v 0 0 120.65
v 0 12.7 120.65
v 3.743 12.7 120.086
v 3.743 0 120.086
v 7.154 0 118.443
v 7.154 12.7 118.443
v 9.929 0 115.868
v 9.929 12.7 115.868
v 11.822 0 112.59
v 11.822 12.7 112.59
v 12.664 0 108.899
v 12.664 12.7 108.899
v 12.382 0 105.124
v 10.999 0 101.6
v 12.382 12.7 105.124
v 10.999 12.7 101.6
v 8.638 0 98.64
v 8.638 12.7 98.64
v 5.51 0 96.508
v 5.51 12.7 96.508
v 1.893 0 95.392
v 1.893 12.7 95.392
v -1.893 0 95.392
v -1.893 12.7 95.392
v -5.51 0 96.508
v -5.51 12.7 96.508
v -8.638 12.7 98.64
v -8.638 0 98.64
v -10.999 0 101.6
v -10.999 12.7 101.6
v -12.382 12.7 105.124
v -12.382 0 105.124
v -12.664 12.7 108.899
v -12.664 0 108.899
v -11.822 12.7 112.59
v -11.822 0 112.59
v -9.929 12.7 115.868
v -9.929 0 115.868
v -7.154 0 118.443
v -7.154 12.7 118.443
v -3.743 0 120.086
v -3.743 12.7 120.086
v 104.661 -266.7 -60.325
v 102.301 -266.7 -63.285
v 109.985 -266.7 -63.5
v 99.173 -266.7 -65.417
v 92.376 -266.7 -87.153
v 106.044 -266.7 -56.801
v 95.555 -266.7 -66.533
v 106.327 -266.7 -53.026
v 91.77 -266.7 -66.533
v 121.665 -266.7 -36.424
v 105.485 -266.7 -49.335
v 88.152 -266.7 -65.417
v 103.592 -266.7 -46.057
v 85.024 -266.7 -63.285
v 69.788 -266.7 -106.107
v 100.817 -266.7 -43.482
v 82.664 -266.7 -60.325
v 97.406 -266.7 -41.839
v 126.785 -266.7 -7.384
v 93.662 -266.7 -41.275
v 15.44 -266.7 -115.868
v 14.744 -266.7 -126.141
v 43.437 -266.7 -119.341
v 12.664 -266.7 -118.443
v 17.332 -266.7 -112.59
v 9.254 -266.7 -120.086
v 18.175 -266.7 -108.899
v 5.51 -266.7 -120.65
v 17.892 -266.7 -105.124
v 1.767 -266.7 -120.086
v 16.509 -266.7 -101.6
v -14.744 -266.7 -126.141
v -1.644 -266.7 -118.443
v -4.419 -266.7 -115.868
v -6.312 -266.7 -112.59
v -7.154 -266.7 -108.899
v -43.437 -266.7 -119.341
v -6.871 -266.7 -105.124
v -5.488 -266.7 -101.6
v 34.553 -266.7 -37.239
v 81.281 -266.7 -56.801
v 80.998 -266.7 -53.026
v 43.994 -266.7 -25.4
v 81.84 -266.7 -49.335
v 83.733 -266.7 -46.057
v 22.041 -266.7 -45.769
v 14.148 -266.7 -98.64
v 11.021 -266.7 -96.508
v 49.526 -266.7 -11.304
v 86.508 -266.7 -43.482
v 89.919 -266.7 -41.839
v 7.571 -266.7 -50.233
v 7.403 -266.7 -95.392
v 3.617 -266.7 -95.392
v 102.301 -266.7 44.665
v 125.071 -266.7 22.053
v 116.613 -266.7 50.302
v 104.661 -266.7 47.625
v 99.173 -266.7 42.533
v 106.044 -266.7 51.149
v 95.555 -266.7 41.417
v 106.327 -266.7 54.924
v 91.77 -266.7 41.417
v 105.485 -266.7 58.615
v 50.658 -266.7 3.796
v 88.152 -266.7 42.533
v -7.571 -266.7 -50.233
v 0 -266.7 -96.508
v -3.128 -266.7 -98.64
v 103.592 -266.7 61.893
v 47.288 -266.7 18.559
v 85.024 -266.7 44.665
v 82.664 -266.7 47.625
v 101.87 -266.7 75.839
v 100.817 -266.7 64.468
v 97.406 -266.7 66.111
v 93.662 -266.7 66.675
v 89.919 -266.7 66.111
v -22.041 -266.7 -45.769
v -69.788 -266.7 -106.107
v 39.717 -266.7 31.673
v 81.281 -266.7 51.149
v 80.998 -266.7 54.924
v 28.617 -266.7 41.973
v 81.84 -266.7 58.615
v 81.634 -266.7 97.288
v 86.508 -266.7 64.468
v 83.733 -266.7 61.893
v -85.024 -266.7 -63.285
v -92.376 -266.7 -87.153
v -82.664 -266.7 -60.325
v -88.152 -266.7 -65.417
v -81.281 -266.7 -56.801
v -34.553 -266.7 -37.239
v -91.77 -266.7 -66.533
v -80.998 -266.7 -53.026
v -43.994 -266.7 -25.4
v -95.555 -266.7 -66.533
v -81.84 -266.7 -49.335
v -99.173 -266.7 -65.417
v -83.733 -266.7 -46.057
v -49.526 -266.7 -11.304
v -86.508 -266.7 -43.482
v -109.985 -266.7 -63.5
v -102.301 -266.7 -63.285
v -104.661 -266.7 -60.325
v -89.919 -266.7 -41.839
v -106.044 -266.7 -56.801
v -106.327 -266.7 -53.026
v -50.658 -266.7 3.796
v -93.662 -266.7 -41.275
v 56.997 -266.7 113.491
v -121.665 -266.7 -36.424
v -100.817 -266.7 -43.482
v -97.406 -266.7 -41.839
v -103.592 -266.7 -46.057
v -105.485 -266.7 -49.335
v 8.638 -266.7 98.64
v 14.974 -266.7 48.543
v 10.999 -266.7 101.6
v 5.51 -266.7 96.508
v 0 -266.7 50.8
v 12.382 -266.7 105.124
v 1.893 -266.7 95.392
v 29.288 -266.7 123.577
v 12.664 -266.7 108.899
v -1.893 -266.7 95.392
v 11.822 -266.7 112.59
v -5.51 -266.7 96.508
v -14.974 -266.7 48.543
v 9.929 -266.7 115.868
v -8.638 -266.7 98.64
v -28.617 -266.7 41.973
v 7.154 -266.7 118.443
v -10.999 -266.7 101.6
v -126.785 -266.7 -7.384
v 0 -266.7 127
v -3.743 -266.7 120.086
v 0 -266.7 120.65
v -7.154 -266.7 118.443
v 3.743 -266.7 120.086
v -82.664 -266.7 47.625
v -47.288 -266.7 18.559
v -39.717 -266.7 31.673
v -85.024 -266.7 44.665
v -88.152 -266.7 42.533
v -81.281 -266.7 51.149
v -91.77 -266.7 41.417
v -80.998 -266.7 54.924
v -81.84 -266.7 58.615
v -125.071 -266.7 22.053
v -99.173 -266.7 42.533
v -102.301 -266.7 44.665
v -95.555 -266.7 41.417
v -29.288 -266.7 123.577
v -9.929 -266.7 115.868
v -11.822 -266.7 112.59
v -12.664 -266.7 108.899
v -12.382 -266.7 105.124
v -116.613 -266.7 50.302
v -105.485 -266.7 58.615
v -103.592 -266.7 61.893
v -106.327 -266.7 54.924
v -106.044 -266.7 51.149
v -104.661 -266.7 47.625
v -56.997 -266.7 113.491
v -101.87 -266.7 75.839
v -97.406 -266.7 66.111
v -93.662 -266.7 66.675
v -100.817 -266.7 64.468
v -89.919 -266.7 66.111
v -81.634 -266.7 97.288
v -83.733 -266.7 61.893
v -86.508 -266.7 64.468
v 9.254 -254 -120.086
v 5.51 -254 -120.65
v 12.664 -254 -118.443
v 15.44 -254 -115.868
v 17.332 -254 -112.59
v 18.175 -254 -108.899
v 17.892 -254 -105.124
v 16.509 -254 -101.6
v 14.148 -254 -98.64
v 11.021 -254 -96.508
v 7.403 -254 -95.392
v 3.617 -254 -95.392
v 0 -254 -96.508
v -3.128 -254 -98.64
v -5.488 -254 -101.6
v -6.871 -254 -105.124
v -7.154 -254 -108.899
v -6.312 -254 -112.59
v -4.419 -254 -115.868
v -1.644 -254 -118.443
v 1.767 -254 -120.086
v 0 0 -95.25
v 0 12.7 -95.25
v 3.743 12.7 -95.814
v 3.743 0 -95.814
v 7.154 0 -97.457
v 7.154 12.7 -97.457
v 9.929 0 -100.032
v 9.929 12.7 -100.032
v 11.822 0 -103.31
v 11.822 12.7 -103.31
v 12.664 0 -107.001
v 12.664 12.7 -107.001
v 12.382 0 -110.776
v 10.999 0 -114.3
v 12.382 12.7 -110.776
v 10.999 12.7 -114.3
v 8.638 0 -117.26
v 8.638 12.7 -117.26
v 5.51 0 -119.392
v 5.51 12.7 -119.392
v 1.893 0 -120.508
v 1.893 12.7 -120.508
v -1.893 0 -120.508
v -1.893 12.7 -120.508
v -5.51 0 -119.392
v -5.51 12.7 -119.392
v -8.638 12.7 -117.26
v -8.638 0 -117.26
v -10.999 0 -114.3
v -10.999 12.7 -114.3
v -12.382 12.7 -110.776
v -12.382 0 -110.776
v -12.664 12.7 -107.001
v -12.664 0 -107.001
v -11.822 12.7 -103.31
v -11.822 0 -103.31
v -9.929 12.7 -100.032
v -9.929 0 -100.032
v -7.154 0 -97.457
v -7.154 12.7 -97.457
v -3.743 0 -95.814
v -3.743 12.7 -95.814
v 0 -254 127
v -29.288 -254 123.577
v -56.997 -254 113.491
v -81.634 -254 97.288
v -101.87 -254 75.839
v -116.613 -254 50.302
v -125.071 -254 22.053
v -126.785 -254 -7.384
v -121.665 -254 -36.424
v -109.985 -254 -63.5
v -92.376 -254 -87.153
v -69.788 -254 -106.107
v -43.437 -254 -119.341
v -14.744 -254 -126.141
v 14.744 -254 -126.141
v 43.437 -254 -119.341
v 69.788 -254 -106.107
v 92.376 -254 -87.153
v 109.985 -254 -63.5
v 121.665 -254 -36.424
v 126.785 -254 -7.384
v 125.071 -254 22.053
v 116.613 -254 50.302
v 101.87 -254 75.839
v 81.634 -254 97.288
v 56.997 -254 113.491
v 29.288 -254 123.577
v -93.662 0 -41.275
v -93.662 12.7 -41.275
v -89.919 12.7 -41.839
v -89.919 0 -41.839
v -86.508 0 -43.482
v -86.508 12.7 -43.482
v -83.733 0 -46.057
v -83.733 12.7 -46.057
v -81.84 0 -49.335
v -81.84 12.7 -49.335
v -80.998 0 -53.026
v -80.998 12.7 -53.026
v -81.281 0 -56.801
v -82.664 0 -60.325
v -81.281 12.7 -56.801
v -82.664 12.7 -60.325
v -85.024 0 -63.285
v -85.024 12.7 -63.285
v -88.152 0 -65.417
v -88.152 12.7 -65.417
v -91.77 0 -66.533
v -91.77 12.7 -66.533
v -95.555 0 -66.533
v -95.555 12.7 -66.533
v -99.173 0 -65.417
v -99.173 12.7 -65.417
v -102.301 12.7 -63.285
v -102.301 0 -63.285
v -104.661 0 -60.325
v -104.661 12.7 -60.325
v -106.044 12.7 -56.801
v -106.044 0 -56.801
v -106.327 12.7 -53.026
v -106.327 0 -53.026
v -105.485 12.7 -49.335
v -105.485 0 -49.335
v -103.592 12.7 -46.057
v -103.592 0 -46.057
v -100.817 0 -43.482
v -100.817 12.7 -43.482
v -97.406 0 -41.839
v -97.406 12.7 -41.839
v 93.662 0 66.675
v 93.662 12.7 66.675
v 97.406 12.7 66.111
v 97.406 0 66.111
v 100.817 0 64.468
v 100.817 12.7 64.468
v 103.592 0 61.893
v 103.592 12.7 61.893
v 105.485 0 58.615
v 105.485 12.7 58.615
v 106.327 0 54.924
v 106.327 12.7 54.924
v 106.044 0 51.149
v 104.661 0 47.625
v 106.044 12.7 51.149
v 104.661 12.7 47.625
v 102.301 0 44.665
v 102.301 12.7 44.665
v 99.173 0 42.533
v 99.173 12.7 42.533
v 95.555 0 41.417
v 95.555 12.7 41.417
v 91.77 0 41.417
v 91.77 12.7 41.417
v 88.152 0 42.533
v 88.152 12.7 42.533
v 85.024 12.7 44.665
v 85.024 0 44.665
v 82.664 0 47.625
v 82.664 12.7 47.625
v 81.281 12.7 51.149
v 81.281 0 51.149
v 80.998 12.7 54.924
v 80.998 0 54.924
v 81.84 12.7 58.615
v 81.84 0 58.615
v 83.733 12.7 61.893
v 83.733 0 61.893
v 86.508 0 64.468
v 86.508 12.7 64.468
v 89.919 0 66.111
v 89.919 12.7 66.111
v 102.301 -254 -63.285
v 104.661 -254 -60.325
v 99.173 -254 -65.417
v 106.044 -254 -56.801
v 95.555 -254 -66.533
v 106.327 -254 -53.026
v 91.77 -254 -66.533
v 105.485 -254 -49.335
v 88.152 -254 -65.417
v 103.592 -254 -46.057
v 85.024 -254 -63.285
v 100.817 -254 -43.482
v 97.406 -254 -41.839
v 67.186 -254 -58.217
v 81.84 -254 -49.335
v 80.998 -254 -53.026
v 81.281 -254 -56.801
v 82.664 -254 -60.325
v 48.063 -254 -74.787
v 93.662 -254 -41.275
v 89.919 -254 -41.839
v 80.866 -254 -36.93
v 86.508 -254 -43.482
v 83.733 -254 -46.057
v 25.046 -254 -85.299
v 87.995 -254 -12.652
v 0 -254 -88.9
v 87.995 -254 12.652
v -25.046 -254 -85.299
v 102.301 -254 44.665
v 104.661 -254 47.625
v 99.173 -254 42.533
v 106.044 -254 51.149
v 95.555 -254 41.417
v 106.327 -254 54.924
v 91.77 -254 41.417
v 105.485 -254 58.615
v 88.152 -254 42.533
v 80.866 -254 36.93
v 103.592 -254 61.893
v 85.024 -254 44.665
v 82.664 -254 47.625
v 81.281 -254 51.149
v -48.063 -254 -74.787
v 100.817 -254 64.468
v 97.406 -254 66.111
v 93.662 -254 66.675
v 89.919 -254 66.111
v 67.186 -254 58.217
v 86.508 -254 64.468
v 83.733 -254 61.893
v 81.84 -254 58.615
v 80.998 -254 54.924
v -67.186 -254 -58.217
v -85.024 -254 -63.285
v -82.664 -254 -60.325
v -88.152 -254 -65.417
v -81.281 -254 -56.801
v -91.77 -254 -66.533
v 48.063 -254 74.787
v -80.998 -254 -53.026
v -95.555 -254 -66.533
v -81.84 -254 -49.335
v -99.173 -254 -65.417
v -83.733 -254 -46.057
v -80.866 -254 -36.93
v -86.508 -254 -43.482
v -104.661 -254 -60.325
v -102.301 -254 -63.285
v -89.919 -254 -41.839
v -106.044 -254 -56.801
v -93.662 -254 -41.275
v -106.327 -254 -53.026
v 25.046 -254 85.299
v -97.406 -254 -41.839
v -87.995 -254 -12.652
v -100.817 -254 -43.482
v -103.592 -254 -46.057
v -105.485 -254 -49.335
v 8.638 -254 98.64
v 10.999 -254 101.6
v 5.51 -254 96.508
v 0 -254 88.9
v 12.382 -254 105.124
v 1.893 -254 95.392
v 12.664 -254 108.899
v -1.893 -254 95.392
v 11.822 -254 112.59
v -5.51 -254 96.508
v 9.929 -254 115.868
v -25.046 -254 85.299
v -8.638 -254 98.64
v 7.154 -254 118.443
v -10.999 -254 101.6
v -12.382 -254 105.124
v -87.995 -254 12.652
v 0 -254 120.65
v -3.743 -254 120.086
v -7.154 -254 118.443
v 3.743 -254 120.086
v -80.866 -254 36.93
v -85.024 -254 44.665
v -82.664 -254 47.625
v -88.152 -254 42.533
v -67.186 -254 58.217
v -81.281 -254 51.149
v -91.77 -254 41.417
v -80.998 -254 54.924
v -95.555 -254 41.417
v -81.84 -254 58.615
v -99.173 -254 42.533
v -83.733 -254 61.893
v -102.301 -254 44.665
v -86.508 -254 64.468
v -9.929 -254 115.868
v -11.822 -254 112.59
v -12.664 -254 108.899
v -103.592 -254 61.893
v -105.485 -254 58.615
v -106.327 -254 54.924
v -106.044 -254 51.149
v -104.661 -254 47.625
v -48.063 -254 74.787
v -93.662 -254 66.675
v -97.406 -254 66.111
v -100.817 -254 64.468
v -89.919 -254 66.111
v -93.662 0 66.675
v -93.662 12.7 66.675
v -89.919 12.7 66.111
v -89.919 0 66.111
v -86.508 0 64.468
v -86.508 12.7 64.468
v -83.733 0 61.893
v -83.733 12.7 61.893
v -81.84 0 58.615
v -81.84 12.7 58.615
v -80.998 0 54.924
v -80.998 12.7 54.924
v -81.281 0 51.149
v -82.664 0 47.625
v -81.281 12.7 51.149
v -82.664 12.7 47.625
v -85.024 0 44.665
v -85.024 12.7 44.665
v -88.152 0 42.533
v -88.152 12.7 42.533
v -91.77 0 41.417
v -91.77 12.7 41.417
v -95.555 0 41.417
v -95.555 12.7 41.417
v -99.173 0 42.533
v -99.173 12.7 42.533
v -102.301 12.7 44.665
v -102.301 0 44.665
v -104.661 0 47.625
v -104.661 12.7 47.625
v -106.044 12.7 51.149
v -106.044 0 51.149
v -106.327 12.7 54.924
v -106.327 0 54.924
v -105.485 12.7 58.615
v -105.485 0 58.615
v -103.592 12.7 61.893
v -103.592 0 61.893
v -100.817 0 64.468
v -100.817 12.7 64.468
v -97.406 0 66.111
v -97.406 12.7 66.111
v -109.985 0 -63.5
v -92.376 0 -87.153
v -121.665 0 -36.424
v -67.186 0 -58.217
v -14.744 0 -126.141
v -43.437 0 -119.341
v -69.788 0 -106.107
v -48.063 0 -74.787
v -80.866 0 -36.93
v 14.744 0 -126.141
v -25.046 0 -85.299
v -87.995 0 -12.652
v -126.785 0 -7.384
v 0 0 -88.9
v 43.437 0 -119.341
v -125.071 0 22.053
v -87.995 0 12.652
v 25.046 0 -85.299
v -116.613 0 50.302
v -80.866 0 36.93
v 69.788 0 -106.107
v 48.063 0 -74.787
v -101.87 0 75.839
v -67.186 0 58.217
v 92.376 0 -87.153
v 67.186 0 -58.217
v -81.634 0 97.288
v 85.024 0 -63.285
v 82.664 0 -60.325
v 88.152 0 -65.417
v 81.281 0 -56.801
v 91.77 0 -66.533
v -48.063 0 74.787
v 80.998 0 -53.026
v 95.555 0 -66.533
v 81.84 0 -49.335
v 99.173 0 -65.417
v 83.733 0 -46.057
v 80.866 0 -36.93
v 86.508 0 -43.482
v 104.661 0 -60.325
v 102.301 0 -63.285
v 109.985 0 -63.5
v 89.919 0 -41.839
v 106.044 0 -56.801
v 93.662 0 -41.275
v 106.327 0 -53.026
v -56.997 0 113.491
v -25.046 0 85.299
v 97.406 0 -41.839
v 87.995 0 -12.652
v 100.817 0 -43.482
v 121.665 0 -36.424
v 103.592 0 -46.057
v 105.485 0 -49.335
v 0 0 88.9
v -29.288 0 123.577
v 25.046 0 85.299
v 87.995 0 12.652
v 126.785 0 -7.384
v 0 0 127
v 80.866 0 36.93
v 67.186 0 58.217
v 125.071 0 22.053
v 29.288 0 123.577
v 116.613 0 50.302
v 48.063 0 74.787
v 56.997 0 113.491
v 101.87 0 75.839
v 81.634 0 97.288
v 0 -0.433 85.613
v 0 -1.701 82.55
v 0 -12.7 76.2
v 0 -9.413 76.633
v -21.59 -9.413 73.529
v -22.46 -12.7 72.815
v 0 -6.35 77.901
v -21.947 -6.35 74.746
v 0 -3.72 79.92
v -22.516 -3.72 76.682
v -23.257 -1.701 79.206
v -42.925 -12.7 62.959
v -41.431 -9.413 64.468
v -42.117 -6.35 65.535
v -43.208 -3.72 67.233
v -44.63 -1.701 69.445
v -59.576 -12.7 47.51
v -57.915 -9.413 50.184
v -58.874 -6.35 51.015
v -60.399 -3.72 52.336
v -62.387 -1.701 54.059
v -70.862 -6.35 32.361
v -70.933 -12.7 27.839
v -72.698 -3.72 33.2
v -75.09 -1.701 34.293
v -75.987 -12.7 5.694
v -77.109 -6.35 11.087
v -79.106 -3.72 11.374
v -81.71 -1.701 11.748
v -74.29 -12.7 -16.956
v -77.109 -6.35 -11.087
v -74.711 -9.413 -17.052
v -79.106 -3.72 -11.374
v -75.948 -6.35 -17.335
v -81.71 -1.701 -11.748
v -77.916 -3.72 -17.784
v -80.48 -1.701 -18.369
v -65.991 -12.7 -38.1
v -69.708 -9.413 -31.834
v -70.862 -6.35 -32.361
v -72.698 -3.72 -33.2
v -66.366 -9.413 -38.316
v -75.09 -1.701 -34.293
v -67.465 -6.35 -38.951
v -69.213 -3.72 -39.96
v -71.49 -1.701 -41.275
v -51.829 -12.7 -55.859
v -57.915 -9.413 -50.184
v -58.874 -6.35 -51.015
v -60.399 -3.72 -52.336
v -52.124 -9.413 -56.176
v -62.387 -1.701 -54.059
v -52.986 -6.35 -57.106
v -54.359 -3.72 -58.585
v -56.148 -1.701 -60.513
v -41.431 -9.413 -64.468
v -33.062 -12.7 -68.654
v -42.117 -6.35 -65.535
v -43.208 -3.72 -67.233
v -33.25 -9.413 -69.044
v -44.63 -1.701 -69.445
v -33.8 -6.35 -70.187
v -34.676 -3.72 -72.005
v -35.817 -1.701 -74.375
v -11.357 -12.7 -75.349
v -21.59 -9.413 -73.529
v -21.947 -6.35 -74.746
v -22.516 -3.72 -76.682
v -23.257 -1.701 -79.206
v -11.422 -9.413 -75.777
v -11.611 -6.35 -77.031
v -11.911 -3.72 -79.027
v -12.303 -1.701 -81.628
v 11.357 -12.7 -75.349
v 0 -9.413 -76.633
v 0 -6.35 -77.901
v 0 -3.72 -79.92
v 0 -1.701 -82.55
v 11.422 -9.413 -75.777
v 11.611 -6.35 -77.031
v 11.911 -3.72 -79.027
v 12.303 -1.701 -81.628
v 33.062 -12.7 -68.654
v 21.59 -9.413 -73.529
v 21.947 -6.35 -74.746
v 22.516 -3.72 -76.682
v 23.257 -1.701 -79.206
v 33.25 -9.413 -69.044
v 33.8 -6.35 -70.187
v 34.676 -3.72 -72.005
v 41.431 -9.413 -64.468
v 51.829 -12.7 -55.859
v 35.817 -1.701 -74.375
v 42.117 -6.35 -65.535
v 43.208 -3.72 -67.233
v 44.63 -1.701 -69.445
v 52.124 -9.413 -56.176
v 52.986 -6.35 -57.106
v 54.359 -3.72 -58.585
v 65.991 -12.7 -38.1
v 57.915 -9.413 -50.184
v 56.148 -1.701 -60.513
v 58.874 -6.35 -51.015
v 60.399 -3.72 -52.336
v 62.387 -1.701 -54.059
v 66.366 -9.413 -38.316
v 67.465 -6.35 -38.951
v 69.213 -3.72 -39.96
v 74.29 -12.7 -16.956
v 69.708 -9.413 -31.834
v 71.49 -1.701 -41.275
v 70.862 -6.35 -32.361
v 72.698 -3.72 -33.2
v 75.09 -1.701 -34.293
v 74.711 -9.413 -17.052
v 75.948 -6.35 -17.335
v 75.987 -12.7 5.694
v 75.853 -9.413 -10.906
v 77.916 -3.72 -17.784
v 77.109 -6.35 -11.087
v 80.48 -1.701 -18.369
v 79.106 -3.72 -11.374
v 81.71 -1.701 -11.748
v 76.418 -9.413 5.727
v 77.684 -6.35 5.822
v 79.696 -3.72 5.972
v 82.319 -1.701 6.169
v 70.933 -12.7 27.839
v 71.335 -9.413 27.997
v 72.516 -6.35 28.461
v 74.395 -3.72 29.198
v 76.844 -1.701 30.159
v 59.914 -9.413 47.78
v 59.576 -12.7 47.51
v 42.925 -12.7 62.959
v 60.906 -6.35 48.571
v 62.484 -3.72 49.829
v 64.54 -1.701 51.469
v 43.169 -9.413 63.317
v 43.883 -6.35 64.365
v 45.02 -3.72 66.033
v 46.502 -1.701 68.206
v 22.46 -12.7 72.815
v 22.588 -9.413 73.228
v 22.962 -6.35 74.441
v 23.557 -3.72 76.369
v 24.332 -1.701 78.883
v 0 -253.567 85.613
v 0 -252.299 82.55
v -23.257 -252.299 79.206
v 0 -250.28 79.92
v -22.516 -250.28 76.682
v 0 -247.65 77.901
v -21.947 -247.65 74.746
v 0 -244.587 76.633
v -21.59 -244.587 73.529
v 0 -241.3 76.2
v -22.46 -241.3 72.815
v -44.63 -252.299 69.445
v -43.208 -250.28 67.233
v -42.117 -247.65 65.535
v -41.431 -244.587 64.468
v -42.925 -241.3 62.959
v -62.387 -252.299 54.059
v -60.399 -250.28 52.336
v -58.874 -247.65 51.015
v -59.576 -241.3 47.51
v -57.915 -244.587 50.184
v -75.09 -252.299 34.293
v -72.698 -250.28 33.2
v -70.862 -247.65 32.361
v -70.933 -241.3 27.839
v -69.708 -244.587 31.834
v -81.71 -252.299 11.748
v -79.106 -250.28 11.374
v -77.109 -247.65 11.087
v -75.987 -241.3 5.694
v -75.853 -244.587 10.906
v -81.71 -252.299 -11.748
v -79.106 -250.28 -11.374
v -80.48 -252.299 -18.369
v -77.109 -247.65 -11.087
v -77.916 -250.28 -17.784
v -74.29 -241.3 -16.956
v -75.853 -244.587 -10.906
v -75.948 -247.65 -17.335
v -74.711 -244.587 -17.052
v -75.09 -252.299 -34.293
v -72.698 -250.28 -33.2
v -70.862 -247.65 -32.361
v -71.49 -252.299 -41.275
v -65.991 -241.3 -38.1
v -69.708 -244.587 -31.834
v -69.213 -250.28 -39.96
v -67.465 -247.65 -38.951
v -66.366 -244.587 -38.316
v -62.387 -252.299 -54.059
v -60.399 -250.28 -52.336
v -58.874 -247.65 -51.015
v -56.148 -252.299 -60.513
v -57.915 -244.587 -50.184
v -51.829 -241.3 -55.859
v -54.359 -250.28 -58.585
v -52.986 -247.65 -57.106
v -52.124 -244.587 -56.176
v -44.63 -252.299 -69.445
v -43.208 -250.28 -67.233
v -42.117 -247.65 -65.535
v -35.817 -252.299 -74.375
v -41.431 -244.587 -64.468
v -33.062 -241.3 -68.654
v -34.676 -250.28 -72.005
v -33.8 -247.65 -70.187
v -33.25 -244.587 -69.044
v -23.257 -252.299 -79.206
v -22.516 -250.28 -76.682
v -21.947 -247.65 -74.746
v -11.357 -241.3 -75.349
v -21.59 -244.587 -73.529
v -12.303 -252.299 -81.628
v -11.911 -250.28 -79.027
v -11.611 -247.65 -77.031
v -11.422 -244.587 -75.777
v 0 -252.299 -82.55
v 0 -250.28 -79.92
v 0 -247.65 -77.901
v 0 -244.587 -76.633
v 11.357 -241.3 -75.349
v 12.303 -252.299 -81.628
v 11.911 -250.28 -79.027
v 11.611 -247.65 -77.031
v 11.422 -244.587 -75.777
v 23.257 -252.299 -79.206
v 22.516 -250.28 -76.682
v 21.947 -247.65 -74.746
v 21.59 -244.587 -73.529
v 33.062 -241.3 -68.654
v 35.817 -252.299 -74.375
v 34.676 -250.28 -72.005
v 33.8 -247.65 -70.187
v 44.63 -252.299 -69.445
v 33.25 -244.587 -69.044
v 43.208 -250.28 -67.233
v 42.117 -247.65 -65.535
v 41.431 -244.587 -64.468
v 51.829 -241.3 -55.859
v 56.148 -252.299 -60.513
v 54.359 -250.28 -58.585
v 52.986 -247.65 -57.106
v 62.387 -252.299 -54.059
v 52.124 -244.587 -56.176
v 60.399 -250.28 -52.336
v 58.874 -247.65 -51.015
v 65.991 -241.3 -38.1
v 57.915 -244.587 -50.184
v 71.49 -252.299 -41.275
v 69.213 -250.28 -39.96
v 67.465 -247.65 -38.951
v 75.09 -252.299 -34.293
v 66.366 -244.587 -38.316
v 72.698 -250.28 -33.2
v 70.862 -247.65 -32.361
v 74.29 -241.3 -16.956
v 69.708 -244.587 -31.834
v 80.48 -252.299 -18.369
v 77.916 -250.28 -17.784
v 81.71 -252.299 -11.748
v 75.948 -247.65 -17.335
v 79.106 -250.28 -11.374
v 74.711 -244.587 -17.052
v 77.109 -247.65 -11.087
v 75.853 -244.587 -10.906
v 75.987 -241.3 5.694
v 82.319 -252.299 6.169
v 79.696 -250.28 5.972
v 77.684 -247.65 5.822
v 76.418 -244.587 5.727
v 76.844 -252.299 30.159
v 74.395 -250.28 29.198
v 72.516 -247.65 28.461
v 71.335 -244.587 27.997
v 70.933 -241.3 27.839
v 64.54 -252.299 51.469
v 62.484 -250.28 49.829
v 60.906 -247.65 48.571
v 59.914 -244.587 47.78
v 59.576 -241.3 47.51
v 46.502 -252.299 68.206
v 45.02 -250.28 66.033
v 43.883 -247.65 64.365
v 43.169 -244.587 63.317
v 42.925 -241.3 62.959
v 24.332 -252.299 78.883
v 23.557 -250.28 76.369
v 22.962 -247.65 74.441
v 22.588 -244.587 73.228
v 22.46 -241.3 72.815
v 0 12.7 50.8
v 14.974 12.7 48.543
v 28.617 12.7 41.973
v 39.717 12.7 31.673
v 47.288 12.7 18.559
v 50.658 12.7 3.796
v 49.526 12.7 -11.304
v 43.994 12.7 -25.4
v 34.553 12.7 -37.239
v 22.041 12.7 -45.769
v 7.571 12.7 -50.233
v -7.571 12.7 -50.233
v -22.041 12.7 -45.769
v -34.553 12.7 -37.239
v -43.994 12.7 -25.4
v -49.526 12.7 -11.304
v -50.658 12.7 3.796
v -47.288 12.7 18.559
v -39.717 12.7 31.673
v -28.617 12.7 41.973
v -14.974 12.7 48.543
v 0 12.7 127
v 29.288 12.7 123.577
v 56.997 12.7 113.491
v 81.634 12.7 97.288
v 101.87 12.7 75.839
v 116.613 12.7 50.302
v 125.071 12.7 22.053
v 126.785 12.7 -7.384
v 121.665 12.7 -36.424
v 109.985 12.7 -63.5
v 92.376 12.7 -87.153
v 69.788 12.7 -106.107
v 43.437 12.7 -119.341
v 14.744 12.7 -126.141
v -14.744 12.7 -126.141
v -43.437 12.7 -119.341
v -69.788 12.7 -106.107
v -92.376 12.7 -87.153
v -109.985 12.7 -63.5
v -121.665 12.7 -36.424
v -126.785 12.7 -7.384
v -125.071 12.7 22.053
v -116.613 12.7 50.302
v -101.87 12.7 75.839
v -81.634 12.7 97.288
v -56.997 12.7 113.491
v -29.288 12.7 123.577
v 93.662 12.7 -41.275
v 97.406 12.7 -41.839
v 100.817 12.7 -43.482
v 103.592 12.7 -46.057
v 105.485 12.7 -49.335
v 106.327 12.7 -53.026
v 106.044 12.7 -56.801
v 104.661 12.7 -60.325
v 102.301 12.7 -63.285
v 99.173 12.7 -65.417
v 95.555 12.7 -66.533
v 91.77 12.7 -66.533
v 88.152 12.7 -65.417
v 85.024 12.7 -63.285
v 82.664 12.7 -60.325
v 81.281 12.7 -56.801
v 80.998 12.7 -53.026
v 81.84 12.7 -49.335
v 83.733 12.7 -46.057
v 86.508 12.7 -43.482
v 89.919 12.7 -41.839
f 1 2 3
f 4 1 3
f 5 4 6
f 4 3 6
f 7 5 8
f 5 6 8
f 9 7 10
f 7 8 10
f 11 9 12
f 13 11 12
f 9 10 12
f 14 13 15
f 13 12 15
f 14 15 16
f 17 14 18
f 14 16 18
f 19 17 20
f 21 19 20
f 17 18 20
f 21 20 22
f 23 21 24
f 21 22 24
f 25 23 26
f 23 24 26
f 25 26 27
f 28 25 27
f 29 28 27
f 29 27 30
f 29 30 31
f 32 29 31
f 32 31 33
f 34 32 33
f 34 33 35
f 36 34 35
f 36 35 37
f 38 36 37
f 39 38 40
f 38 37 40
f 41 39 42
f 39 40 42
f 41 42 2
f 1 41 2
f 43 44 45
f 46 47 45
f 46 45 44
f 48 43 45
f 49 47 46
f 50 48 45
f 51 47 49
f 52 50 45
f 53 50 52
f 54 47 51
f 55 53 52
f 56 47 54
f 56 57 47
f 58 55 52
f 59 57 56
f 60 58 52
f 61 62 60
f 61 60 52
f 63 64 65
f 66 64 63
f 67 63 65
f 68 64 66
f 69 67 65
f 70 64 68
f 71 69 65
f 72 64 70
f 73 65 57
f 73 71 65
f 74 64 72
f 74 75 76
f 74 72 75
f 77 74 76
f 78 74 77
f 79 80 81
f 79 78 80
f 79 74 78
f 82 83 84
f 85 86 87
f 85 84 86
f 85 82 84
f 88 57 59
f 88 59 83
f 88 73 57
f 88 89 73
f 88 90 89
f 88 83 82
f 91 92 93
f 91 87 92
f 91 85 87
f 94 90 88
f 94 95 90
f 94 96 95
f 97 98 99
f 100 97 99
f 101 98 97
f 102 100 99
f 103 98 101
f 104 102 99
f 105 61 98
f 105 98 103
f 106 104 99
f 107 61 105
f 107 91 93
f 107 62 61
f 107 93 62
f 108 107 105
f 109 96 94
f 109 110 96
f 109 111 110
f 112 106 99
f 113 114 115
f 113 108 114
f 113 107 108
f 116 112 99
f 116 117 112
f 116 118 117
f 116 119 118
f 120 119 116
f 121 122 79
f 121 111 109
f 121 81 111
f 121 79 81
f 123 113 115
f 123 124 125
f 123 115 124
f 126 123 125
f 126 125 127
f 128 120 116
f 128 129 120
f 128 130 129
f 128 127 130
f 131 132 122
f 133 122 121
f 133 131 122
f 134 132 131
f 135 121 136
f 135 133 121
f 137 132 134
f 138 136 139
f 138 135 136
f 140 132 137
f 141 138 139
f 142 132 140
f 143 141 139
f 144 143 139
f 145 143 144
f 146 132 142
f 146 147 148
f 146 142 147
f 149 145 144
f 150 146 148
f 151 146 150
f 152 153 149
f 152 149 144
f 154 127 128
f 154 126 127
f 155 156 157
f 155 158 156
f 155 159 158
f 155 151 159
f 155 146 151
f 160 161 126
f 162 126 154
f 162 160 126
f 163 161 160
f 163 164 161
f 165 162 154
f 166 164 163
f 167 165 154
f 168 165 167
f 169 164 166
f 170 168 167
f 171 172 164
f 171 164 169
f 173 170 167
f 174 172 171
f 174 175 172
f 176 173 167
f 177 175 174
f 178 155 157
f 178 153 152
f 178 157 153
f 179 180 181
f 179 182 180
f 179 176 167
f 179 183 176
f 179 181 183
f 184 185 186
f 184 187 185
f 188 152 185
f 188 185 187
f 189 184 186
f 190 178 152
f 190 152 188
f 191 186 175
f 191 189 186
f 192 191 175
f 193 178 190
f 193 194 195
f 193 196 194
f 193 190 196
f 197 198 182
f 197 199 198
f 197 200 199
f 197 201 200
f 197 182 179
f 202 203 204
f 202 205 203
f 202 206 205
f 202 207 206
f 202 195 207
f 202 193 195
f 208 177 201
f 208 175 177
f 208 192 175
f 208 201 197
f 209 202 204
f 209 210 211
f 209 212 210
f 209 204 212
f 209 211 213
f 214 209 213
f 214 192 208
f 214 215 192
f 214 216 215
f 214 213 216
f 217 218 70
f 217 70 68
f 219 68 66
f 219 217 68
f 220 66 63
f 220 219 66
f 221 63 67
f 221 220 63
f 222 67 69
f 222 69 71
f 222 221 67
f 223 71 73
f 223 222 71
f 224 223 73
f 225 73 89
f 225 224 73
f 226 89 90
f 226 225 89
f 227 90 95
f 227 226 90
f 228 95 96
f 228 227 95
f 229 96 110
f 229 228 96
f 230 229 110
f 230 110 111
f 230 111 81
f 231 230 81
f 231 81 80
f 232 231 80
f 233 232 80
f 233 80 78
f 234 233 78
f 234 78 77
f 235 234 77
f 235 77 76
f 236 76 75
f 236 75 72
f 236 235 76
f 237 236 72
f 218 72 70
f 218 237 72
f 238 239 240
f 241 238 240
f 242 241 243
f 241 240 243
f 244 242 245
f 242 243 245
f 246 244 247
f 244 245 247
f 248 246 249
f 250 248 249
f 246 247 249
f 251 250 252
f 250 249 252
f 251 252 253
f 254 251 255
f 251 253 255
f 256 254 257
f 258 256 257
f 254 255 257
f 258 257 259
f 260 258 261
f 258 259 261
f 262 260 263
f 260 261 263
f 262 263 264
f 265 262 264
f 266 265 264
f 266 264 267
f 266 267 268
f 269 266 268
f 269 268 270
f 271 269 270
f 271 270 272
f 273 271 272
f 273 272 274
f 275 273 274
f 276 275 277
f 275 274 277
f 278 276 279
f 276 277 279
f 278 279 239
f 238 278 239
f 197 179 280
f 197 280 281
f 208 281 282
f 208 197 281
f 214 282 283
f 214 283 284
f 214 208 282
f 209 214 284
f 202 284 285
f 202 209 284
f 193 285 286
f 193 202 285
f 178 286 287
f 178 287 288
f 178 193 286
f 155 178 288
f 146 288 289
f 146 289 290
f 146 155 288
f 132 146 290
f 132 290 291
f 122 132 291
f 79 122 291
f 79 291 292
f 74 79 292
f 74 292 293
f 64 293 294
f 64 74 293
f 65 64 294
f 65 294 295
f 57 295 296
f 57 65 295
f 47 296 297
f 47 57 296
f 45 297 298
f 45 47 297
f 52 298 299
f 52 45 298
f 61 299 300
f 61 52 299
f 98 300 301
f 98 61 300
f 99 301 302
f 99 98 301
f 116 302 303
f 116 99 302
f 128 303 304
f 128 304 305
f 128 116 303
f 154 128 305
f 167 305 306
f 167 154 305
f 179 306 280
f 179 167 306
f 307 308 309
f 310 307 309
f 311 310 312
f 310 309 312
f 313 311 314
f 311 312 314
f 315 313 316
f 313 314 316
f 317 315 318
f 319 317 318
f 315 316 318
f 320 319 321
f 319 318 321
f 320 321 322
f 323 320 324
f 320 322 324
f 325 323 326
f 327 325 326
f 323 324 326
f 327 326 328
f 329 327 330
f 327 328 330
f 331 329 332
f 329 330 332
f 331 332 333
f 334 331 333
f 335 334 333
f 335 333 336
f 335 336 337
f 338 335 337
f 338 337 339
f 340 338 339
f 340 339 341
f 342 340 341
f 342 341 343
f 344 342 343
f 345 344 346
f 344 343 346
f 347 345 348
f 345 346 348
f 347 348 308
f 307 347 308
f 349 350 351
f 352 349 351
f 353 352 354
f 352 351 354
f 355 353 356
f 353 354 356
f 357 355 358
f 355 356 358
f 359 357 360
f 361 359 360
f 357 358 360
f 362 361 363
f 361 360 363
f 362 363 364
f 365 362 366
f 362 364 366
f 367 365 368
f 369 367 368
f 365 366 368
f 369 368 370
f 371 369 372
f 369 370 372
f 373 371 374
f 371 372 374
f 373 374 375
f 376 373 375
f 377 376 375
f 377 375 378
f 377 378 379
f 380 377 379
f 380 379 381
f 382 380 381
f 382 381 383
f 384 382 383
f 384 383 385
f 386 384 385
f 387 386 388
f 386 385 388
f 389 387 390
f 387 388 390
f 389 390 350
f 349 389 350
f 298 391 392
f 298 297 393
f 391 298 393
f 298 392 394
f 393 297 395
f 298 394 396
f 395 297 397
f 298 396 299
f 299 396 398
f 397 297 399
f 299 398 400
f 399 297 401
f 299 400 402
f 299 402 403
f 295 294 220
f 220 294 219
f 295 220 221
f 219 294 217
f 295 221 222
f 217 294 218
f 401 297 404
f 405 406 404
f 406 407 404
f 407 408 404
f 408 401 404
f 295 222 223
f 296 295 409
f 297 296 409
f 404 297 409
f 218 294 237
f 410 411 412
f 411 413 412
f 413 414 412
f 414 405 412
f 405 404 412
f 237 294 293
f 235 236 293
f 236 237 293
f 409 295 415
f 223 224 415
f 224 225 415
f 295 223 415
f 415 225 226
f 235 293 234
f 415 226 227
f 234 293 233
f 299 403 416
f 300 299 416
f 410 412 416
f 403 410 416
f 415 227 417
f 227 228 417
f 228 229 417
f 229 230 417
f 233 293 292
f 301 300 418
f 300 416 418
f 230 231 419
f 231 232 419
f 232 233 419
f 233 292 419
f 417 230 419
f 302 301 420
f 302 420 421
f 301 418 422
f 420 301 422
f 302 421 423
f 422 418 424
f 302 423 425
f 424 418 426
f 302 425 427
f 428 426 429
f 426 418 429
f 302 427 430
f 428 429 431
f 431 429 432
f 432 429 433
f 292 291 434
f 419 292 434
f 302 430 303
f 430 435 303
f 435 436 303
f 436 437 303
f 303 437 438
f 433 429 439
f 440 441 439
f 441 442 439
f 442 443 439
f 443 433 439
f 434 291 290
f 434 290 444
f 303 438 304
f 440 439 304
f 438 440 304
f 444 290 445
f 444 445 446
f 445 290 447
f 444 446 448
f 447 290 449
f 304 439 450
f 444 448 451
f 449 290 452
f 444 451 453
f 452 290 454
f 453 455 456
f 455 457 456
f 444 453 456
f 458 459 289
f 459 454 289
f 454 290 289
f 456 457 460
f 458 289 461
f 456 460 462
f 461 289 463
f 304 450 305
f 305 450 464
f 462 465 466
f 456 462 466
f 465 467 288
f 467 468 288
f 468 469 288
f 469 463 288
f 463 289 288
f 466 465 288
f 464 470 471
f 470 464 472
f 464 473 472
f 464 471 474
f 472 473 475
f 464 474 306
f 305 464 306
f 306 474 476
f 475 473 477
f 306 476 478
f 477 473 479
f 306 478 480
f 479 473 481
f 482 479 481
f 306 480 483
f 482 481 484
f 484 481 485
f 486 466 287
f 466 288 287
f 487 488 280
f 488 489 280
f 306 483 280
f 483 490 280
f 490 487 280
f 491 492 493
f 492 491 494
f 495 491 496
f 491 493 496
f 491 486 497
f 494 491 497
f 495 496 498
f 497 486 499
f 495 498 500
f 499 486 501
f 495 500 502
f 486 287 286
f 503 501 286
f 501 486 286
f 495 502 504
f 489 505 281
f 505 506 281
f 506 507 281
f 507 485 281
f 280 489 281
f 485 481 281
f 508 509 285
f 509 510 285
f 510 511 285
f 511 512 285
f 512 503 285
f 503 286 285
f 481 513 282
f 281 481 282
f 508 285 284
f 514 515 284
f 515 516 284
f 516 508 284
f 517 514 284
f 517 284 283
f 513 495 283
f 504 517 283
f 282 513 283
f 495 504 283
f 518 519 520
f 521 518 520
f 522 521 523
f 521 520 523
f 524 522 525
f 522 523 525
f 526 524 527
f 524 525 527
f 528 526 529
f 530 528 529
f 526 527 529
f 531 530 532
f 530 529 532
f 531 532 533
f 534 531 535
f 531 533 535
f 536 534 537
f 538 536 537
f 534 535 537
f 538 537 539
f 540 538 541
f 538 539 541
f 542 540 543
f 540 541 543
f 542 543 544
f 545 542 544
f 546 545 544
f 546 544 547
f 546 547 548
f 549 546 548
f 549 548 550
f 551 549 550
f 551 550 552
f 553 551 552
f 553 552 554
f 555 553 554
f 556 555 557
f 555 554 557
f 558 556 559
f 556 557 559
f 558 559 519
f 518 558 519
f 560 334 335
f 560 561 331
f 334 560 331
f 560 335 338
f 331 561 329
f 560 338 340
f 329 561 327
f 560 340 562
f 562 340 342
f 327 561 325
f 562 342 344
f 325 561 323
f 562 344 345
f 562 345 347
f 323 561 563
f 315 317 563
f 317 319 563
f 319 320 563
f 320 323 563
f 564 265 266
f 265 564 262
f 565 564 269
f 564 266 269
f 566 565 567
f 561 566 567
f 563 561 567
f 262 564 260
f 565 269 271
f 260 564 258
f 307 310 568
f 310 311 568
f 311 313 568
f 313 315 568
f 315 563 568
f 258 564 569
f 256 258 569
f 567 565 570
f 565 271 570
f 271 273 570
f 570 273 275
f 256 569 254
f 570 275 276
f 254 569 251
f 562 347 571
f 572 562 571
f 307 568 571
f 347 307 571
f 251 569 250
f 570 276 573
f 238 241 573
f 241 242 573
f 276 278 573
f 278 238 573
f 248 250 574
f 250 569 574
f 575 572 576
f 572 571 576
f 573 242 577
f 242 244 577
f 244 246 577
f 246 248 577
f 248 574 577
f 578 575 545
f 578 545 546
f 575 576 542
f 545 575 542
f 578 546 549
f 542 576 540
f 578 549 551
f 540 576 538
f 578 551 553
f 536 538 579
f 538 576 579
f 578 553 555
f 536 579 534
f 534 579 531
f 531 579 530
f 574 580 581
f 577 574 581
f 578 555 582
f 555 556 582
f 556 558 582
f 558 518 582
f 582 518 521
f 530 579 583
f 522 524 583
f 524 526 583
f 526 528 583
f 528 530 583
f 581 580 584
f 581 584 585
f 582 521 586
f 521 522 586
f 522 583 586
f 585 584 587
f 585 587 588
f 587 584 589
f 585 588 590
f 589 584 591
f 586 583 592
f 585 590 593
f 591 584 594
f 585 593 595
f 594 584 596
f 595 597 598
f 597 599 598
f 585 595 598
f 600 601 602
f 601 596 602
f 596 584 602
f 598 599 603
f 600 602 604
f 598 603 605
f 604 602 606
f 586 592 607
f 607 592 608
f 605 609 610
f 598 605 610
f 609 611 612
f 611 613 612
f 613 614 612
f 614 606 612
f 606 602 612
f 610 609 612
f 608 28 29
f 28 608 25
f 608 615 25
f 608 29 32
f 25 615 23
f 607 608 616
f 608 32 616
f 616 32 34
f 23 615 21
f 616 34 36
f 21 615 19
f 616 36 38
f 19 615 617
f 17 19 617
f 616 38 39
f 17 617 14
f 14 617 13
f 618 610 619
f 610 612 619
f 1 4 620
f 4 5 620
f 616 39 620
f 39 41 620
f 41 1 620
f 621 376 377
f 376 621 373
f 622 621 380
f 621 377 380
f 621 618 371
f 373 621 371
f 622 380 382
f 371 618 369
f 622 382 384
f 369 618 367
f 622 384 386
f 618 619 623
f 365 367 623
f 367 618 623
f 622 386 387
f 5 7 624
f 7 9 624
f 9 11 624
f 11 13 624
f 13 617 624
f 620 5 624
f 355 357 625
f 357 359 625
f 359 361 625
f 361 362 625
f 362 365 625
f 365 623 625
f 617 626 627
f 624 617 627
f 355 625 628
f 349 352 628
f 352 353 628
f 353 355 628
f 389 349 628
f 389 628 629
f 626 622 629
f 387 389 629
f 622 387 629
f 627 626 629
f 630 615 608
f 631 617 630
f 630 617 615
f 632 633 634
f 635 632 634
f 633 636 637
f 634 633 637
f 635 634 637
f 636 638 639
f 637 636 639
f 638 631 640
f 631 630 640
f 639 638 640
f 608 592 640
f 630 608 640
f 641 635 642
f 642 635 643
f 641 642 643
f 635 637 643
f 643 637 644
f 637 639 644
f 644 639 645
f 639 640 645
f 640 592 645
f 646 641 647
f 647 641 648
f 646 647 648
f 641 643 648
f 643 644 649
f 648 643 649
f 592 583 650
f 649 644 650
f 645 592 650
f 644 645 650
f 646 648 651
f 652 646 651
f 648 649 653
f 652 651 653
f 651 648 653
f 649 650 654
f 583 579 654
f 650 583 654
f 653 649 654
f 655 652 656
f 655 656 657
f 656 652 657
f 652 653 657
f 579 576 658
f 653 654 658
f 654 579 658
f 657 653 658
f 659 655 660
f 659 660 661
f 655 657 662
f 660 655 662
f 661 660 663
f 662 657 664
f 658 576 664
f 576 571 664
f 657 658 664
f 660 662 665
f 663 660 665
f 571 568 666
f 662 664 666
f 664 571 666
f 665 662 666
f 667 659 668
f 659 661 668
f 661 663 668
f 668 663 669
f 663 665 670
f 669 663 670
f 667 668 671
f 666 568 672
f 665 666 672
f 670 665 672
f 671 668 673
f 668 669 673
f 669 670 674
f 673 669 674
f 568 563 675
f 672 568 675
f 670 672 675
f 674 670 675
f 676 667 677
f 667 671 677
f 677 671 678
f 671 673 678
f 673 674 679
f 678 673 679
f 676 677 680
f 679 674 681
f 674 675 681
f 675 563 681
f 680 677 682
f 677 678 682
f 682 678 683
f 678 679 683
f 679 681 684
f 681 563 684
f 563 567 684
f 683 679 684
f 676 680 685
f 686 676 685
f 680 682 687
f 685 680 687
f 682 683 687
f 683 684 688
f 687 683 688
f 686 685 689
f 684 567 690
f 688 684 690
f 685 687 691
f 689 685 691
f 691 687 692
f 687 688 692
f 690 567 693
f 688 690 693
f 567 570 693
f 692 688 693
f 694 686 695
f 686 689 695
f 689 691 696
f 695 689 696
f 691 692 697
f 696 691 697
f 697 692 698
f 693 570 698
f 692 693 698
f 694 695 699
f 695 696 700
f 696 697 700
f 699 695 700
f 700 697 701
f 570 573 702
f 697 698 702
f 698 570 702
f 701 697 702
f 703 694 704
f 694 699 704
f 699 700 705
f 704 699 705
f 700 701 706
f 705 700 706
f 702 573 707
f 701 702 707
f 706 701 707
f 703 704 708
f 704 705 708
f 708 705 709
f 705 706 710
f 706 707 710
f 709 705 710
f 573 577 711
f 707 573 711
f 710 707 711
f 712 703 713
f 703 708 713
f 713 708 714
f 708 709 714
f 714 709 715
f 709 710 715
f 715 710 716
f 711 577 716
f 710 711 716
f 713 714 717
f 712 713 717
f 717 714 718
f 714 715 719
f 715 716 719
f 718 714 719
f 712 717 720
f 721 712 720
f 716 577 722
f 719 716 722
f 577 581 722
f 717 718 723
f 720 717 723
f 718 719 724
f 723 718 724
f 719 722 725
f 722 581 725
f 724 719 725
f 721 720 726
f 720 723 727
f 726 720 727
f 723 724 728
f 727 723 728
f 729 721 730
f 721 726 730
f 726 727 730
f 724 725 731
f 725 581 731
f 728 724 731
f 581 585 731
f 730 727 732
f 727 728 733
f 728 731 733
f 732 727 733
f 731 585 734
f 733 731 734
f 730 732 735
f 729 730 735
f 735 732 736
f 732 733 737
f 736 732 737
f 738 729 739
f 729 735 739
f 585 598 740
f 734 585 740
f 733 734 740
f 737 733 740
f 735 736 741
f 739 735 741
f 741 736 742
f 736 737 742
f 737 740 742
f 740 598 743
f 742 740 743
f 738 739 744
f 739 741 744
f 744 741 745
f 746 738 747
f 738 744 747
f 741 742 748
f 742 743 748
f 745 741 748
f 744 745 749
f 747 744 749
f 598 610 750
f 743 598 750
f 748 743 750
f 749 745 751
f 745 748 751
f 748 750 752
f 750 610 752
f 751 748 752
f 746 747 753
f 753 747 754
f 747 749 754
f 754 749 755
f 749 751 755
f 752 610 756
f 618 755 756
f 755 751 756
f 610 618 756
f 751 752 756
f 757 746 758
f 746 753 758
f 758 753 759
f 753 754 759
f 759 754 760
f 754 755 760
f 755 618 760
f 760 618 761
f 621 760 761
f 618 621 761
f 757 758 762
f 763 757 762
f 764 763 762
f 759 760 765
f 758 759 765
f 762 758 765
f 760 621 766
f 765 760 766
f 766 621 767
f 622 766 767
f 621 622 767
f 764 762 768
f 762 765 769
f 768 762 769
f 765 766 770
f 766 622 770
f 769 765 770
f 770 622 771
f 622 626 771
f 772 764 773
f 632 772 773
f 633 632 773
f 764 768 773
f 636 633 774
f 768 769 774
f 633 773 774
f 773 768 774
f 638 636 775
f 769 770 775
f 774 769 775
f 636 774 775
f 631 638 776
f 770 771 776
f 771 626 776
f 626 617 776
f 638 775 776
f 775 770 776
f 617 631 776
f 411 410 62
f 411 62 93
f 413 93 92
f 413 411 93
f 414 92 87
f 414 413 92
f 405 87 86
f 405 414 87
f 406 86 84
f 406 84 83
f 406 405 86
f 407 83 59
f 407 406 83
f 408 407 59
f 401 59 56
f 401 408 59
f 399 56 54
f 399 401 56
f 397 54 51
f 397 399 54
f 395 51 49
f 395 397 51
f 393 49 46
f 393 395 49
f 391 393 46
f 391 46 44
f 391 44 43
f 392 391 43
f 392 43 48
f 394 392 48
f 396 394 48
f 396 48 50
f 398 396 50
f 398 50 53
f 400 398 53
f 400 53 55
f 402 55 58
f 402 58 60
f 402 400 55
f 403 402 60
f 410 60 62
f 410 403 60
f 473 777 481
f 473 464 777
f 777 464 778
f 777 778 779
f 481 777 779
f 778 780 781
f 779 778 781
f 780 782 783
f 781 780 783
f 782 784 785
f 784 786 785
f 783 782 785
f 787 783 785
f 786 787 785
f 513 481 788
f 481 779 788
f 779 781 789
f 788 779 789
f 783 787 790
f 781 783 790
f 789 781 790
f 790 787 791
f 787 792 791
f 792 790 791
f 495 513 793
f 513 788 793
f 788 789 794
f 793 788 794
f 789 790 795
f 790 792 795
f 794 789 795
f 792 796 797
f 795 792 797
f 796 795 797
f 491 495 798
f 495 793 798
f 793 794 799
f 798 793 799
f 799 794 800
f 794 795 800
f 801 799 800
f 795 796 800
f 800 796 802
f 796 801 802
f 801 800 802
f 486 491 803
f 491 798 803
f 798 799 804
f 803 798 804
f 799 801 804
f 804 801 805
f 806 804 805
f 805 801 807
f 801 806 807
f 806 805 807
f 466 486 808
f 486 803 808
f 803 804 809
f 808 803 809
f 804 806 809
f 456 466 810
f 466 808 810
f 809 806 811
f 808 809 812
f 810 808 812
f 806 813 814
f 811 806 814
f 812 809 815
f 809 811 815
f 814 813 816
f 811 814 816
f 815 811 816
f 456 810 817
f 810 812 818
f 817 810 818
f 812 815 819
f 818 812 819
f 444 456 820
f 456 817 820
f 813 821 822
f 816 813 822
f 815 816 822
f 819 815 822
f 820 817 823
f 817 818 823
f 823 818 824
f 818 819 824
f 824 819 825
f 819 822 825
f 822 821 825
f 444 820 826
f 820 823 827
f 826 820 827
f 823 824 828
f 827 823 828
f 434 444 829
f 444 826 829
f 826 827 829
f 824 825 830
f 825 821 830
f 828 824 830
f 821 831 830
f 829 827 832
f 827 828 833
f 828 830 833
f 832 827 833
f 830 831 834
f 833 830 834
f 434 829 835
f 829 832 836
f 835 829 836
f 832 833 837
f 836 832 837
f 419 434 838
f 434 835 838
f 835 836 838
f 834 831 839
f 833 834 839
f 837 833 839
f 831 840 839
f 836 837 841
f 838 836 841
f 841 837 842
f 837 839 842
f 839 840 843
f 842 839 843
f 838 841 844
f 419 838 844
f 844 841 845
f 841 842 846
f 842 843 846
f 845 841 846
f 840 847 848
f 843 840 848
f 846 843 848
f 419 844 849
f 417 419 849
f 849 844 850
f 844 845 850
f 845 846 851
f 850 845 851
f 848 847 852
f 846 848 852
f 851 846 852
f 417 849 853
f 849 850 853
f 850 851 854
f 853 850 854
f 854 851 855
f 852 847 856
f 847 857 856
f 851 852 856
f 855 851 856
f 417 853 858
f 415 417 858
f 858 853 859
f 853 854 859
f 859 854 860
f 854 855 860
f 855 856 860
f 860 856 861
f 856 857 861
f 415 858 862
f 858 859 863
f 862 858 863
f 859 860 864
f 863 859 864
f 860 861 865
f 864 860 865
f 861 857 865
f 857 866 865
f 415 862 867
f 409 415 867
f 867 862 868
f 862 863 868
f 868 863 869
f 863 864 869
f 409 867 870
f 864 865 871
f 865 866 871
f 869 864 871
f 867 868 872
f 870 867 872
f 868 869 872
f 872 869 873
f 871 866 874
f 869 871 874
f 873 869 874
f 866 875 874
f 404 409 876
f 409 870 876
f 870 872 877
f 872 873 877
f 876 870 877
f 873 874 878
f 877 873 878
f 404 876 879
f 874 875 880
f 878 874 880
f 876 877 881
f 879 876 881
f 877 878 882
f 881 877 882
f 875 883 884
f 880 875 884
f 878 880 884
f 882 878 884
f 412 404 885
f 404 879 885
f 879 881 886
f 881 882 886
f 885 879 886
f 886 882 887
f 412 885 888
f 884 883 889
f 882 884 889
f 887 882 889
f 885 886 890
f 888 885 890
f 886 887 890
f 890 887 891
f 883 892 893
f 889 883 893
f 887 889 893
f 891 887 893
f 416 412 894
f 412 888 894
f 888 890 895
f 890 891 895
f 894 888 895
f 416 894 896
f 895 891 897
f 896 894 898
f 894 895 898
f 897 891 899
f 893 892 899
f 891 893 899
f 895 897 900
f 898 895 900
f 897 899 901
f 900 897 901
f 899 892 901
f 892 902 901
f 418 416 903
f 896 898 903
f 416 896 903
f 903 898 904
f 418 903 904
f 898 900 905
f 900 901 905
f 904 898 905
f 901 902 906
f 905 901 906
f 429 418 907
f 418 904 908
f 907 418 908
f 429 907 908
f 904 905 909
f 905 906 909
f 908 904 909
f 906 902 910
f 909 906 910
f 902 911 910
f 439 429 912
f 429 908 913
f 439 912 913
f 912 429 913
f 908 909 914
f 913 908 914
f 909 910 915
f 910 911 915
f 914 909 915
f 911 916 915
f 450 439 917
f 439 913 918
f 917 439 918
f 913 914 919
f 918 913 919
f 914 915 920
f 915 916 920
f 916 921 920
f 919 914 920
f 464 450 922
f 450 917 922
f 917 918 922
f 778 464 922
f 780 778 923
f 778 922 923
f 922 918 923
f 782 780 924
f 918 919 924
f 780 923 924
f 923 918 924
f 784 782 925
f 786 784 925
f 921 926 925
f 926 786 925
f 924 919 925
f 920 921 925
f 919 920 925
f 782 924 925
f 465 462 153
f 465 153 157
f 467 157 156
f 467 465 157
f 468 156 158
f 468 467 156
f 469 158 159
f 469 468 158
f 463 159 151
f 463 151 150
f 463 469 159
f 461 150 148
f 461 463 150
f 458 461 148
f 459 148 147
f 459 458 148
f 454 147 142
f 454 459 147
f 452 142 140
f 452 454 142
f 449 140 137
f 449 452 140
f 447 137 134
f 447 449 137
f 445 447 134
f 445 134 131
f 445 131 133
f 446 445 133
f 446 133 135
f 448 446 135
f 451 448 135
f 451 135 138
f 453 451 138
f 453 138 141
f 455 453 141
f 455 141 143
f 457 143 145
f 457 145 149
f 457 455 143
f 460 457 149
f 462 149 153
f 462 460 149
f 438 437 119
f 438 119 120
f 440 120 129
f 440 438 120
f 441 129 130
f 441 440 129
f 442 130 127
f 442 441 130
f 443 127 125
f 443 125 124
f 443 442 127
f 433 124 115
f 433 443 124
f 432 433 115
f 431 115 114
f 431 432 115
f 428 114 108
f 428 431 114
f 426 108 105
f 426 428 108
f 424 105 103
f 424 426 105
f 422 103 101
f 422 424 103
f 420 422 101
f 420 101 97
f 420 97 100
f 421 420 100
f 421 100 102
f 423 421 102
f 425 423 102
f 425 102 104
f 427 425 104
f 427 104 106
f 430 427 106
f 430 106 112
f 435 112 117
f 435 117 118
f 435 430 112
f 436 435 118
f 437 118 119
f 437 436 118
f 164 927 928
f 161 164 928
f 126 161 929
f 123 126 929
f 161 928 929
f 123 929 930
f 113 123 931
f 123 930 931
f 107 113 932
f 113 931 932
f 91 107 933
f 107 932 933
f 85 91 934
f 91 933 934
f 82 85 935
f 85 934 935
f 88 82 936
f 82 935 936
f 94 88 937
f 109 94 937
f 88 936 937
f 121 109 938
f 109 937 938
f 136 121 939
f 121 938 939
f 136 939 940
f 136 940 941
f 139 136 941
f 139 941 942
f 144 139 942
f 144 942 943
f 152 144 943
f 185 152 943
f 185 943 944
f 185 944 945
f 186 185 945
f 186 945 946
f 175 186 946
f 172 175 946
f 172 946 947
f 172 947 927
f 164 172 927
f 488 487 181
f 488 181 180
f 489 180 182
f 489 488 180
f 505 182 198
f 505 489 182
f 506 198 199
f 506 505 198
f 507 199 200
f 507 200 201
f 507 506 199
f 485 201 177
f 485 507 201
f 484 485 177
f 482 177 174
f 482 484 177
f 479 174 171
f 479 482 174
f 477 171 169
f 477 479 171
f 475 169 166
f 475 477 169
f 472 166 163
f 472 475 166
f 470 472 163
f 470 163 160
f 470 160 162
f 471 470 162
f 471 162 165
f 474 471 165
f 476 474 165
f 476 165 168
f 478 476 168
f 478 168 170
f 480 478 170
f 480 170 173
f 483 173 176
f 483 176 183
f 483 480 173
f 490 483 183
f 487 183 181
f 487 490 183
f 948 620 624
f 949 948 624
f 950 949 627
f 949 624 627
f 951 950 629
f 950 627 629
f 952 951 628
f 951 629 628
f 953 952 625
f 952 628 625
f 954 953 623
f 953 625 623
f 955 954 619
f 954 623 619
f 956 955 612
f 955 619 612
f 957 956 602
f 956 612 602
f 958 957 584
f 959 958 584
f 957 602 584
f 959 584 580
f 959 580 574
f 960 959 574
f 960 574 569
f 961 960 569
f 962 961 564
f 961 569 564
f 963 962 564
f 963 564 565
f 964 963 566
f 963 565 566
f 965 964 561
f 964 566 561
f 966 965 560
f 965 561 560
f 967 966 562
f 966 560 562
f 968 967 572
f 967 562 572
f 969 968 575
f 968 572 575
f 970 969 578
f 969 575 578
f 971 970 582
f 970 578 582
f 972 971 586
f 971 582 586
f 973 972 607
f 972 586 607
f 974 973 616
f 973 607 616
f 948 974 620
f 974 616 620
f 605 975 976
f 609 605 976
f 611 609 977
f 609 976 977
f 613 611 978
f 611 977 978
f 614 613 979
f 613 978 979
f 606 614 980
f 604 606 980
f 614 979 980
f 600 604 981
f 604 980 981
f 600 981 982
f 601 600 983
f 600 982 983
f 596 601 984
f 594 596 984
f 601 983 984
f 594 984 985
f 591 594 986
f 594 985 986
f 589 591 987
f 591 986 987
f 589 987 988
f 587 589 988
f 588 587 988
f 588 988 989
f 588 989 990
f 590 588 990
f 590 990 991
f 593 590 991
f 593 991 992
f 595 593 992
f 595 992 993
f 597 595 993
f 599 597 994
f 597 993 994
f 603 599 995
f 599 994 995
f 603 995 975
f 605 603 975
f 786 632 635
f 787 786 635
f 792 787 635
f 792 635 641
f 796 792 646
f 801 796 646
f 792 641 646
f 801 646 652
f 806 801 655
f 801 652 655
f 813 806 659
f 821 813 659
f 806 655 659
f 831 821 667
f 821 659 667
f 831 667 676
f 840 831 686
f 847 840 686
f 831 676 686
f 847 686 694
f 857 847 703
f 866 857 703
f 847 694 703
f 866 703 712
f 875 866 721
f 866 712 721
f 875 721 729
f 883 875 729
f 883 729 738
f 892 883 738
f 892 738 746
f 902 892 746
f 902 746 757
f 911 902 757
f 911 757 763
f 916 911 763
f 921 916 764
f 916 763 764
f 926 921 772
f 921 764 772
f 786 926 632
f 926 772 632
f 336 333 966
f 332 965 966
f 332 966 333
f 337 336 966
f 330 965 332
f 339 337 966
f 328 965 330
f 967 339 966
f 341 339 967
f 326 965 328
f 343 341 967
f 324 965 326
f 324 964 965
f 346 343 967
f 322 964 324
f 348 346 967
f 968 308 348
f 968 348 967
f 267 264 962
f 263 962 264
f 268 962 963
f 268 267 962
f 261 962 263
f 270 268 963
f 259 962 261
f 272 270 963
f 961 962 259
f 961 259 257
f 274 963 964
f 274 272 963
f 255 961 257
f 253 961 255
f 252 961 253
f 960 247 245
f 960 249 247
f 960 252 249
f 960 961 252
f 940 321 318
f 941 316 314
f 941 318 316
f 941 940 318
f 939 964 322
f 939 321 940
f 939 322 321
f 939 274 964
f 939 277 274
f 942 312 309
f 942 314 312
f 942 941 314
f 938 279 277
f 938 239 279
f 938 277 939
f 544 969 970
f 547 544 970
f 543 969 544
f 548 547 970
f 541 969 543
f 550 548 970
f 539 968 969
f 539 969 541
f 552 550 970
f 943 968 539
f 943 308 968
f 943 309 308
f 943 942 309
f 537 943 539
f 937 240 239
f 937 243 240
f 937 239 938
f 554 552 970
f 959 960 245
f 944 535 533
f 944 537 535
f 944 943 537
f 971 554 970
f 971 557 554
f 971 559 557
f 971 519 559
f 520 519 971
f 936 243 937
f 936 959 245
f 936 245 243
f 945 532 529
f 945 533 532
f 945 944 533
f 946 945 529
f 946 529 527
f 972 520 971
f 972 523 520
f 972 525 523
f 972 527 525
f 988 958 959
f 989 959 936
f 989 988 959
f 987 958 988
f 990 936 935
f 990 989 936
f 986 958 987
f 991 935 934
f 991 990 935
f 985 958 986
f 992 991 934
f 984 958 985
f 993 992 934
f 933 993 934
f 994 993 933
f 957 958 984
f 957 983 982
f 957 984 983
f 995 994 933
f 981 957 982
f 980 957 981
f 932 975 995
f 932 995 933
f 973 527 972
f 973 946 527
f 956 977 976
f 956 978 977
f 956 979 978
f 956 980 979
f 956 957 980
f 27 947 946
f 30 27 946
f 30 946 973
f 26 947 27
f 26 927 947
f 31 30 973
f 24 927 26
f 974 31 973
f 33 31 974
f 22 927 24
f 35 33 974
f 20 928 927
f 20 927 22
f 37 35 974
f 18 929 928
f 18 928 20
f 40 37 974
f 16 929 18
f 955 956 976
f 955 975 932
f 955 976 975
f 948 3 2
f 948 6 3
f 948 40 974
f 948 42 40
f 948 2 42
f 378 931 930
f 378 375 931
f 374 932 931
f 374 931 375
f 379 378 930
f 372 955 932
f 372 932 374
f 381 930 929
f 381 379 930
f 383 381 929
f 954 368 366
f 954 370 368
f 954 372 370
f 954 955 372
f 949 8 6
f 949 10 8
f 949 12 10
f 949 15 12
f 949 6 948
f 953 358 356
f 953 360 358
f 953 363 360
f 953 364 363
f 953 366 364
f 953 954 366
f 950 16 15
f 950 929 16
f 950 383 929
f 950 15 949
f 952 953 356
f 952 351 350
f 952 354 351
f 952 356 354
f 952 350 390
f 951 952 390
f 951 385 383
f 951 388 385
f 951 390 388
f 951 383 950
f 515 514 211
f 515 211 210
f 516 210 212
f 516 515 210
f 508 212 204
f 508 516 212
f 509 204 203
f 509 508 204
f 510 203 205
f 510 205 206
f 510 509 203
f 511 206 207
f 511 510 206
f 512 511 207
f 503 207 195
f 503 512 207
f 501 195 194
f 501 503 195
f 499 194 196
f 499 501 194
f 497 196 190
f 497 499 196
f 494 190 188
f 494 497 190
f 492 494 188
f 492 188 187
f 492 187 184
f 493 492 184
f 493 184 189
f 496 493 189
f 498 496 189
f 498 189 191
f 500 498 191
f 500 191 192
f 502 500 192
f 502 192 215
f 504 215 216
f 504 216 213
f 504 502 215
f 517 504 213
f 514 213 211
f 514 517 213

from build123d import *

# Parameters (mm, degrees)
SKETCH1_R           = 127
BOSS_EXTRUDE1_DEPTH = 12.7
SKETCH2_R           = 12.7
CUT_EXTRUDE1_DEPTH  = 12.7
SKETCH3_R           = 76.2
BOSS_EXTRUDE2_DEPTH = 254
BOSS_EXTRUDE3_START = 12.7
SKETCH4_R           = 127
BOSS_EXTRUDE3_DEPTH = 12.7
CUT_EXTRUDE2_START  = -12.7
SKETCH5_R           = 12.7
CUT_EXTRUDE2_DEPTH  = 12.7
FILLET1_R           = 12.7
SKETCH6_R           = 50.8
CUT_EXTRUDE3_DEPTH  = 325.12


with BuildPart() as part:
    # Sketch1 → Boss-Extrude1 (new body)
    with BuildSketch(Plane(origin=(0, 0, 0), x_dir=(1, 0, 0), z_dir=(0, 1, 0))):
        with Locations(Location((0, 0, 0), (0, 0, 270))):
            Circle(SKETCH1_R)
    extrude(amount=BOSS_EXTRUDE1_DEPTH)

    # Sketch2 → Cut-Extrude1 (cut)
    with BuildSketch(Plane(origin=(0, 12.7, 0), x_dir=(1, 0, 0), z_dir=(0, 1, 0))):
        with Locations(Location((0, 107.95, 0), (0, 0, 270))):
            Circle(SKETCH2_R)
        with Locations(Location((0, -107.95, 0), (0, 0, 270))):
            Circle(SKETCH2_R)
        with Locations(Location((-93.6625, 53.975, 0), (0, 0, 270))):
            Circle(SKETCH2_R)
        with Locations(Location((93.6625, 53.975, 0), (0, 0, 270))):
            Circle(SKETCH2_R)
        with Locations(Location((-93.6625, -53.975, 0), (0, 0, 270))):
            Circle(SKETCH2_R)
        with Locations(Location((93.6625, -53.975, 0), (0, 0, 270))):
            Circle(SKETCH2_R)
    extrude(amount=-CUT_EXTRUDE1_DEPTH, mode=Mode.SUBTRACT)

    # Sketch3 → Boss-Extrude2 (add)
    with BuildSketch(Plane.XZ):
        with Locations(Location((0, 0, 0), (0, 0, 90))):
            Circle(SKETCH3_R)
    extrude(amount=BOSS_EXTRUDE2_DEPTH)

    # Sketch4 → Boss-Extrude3 (add)
    with BuildSketch(Plane.XZ.offset(254).offset(BOSS_EXTRUDE3_START)):
        with Locations(Location((0, 0, 0), (0, 0, 90))):
            Circle(SKETCH4_R)
    extrude(amount=-BOSS_EXTRUDE3_DEPTH)

    # Sketch5 → Cut-Extrude2 (cut)
    with BuildSketch(Plane.XZ.offset(266.7).offset(CUT_EXTRUDE2_START)):
        with Locations(Location((0, 107.95, 0), (0, 0, 90))):
            Circle(SKETCH5_R)
        with Locations(Location((5.510274908, -107.95, 0), (0, 0, 270))):
            Circle(SKETCH5_R)
        with Locations(Location((-93.6625, 53.975, 0), (0, 0, 90))):
            Circle(SKETCH5_R)
        with Locations(Location((93.6625, 53.975, 0), (0, 0, 90))):
            Circle(SKETCH5_R)
        with Locations(Location((-93.6625, -53.975, 0), (0, 0, 90))):
            Circle(SKETCH5_R)
        with Locations(Location((93.6625, -53.975, 0), (0, 0, 90))):
            Circle(SKETCH5_R)
    extrude(amount=CUT_EXTRUDE2_DEPTH, mode=Mode.SUBTRACT)

    # Fillet1
    fillet1_edges = [part.edges().sort_by_distance(p)[0] for p in [
        (0, 0, -76.2),
        (0, -254, -76.2),
    ]]
    fillet(fillet1_edges, radius=FILLET1_R)

    # Sketch6 → Cut-Extrude3 (cut)
    with BuildSketch(Plane(origin=(0, 12.7, 0), x_dir=(1, 0, 0), z_dir=(0, 1, 0))):
        with Locations(Location((0, 0, 0), (0, 0, 270))):
            Circle(SKETCH6_R)
    extrude(amount=-CUT_EXTRUDE3_DEPTH, mode=Mode.SUBTRACT)


solid = part.part
